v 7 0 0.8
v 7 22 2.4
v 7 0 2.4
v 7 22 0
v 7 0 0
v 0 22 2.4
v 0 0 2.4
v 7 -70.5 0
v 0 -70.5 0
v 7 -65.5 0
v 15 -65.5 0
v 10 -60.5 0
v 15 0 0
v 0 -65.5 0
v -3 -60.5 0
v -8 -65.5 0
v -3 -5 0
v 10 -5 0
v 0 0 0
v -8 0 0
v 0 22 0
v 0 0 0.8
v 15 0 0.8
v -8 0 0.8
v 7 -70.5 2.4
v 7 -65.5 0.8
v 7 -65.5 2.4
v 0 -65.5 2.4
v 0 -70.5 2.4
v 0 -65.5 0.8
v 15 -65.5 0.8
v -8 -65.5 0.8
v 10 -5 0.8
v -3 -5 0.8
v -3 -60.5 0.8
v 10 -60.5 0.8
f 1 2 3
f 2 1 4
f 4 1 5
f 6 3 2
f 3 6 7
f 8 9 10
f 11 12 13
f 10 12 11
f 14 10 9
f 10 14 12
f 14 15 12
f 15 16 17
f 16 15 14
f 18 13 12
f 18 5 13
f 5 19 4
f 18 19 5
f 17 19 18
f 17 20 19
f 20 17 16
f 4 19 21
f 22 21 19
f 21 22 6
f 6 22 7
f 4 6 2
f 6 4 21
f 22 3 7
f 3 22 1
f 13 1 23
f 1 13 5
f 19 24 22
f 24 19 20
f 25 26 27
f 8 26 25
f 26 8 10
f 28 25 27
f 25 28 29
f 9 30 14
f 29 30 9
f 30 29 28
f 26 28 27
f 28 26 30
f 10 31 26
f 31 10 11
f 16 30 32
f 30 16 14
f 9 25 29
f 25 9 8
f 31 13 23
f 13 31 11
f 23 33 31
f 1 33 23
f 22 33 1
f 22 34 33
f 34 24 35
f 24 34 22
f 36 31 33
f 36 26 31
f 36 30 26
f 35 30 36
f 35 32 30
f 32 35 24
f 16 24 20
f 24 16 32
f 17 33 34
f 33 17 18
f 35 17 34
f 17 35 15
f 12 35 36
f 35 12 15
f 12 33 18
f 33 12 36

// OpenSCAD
module releaser(holelength)
{
  translate(v=[0,0,0])
    cube(size=[7,22,2.4]);

  translate(v=[0,-5-holelength-10,0])
    cube(size=[7,5,2.4]);

  translate(v=[-8,-5,0])
    cube(size=[23,5,0.8]);

  translate(v=[-8,-5-holelength,0])
    cube(size=[5,holelength,0.8]);

  translate(v=[10,-5-holelength,0])
    cube(size=[5,holelength,0.8]);

  translate(v=[-8,-5-holelength-5,0])
    cube(size=[23,5,0.8]);
}

releaser(37*1.5);
